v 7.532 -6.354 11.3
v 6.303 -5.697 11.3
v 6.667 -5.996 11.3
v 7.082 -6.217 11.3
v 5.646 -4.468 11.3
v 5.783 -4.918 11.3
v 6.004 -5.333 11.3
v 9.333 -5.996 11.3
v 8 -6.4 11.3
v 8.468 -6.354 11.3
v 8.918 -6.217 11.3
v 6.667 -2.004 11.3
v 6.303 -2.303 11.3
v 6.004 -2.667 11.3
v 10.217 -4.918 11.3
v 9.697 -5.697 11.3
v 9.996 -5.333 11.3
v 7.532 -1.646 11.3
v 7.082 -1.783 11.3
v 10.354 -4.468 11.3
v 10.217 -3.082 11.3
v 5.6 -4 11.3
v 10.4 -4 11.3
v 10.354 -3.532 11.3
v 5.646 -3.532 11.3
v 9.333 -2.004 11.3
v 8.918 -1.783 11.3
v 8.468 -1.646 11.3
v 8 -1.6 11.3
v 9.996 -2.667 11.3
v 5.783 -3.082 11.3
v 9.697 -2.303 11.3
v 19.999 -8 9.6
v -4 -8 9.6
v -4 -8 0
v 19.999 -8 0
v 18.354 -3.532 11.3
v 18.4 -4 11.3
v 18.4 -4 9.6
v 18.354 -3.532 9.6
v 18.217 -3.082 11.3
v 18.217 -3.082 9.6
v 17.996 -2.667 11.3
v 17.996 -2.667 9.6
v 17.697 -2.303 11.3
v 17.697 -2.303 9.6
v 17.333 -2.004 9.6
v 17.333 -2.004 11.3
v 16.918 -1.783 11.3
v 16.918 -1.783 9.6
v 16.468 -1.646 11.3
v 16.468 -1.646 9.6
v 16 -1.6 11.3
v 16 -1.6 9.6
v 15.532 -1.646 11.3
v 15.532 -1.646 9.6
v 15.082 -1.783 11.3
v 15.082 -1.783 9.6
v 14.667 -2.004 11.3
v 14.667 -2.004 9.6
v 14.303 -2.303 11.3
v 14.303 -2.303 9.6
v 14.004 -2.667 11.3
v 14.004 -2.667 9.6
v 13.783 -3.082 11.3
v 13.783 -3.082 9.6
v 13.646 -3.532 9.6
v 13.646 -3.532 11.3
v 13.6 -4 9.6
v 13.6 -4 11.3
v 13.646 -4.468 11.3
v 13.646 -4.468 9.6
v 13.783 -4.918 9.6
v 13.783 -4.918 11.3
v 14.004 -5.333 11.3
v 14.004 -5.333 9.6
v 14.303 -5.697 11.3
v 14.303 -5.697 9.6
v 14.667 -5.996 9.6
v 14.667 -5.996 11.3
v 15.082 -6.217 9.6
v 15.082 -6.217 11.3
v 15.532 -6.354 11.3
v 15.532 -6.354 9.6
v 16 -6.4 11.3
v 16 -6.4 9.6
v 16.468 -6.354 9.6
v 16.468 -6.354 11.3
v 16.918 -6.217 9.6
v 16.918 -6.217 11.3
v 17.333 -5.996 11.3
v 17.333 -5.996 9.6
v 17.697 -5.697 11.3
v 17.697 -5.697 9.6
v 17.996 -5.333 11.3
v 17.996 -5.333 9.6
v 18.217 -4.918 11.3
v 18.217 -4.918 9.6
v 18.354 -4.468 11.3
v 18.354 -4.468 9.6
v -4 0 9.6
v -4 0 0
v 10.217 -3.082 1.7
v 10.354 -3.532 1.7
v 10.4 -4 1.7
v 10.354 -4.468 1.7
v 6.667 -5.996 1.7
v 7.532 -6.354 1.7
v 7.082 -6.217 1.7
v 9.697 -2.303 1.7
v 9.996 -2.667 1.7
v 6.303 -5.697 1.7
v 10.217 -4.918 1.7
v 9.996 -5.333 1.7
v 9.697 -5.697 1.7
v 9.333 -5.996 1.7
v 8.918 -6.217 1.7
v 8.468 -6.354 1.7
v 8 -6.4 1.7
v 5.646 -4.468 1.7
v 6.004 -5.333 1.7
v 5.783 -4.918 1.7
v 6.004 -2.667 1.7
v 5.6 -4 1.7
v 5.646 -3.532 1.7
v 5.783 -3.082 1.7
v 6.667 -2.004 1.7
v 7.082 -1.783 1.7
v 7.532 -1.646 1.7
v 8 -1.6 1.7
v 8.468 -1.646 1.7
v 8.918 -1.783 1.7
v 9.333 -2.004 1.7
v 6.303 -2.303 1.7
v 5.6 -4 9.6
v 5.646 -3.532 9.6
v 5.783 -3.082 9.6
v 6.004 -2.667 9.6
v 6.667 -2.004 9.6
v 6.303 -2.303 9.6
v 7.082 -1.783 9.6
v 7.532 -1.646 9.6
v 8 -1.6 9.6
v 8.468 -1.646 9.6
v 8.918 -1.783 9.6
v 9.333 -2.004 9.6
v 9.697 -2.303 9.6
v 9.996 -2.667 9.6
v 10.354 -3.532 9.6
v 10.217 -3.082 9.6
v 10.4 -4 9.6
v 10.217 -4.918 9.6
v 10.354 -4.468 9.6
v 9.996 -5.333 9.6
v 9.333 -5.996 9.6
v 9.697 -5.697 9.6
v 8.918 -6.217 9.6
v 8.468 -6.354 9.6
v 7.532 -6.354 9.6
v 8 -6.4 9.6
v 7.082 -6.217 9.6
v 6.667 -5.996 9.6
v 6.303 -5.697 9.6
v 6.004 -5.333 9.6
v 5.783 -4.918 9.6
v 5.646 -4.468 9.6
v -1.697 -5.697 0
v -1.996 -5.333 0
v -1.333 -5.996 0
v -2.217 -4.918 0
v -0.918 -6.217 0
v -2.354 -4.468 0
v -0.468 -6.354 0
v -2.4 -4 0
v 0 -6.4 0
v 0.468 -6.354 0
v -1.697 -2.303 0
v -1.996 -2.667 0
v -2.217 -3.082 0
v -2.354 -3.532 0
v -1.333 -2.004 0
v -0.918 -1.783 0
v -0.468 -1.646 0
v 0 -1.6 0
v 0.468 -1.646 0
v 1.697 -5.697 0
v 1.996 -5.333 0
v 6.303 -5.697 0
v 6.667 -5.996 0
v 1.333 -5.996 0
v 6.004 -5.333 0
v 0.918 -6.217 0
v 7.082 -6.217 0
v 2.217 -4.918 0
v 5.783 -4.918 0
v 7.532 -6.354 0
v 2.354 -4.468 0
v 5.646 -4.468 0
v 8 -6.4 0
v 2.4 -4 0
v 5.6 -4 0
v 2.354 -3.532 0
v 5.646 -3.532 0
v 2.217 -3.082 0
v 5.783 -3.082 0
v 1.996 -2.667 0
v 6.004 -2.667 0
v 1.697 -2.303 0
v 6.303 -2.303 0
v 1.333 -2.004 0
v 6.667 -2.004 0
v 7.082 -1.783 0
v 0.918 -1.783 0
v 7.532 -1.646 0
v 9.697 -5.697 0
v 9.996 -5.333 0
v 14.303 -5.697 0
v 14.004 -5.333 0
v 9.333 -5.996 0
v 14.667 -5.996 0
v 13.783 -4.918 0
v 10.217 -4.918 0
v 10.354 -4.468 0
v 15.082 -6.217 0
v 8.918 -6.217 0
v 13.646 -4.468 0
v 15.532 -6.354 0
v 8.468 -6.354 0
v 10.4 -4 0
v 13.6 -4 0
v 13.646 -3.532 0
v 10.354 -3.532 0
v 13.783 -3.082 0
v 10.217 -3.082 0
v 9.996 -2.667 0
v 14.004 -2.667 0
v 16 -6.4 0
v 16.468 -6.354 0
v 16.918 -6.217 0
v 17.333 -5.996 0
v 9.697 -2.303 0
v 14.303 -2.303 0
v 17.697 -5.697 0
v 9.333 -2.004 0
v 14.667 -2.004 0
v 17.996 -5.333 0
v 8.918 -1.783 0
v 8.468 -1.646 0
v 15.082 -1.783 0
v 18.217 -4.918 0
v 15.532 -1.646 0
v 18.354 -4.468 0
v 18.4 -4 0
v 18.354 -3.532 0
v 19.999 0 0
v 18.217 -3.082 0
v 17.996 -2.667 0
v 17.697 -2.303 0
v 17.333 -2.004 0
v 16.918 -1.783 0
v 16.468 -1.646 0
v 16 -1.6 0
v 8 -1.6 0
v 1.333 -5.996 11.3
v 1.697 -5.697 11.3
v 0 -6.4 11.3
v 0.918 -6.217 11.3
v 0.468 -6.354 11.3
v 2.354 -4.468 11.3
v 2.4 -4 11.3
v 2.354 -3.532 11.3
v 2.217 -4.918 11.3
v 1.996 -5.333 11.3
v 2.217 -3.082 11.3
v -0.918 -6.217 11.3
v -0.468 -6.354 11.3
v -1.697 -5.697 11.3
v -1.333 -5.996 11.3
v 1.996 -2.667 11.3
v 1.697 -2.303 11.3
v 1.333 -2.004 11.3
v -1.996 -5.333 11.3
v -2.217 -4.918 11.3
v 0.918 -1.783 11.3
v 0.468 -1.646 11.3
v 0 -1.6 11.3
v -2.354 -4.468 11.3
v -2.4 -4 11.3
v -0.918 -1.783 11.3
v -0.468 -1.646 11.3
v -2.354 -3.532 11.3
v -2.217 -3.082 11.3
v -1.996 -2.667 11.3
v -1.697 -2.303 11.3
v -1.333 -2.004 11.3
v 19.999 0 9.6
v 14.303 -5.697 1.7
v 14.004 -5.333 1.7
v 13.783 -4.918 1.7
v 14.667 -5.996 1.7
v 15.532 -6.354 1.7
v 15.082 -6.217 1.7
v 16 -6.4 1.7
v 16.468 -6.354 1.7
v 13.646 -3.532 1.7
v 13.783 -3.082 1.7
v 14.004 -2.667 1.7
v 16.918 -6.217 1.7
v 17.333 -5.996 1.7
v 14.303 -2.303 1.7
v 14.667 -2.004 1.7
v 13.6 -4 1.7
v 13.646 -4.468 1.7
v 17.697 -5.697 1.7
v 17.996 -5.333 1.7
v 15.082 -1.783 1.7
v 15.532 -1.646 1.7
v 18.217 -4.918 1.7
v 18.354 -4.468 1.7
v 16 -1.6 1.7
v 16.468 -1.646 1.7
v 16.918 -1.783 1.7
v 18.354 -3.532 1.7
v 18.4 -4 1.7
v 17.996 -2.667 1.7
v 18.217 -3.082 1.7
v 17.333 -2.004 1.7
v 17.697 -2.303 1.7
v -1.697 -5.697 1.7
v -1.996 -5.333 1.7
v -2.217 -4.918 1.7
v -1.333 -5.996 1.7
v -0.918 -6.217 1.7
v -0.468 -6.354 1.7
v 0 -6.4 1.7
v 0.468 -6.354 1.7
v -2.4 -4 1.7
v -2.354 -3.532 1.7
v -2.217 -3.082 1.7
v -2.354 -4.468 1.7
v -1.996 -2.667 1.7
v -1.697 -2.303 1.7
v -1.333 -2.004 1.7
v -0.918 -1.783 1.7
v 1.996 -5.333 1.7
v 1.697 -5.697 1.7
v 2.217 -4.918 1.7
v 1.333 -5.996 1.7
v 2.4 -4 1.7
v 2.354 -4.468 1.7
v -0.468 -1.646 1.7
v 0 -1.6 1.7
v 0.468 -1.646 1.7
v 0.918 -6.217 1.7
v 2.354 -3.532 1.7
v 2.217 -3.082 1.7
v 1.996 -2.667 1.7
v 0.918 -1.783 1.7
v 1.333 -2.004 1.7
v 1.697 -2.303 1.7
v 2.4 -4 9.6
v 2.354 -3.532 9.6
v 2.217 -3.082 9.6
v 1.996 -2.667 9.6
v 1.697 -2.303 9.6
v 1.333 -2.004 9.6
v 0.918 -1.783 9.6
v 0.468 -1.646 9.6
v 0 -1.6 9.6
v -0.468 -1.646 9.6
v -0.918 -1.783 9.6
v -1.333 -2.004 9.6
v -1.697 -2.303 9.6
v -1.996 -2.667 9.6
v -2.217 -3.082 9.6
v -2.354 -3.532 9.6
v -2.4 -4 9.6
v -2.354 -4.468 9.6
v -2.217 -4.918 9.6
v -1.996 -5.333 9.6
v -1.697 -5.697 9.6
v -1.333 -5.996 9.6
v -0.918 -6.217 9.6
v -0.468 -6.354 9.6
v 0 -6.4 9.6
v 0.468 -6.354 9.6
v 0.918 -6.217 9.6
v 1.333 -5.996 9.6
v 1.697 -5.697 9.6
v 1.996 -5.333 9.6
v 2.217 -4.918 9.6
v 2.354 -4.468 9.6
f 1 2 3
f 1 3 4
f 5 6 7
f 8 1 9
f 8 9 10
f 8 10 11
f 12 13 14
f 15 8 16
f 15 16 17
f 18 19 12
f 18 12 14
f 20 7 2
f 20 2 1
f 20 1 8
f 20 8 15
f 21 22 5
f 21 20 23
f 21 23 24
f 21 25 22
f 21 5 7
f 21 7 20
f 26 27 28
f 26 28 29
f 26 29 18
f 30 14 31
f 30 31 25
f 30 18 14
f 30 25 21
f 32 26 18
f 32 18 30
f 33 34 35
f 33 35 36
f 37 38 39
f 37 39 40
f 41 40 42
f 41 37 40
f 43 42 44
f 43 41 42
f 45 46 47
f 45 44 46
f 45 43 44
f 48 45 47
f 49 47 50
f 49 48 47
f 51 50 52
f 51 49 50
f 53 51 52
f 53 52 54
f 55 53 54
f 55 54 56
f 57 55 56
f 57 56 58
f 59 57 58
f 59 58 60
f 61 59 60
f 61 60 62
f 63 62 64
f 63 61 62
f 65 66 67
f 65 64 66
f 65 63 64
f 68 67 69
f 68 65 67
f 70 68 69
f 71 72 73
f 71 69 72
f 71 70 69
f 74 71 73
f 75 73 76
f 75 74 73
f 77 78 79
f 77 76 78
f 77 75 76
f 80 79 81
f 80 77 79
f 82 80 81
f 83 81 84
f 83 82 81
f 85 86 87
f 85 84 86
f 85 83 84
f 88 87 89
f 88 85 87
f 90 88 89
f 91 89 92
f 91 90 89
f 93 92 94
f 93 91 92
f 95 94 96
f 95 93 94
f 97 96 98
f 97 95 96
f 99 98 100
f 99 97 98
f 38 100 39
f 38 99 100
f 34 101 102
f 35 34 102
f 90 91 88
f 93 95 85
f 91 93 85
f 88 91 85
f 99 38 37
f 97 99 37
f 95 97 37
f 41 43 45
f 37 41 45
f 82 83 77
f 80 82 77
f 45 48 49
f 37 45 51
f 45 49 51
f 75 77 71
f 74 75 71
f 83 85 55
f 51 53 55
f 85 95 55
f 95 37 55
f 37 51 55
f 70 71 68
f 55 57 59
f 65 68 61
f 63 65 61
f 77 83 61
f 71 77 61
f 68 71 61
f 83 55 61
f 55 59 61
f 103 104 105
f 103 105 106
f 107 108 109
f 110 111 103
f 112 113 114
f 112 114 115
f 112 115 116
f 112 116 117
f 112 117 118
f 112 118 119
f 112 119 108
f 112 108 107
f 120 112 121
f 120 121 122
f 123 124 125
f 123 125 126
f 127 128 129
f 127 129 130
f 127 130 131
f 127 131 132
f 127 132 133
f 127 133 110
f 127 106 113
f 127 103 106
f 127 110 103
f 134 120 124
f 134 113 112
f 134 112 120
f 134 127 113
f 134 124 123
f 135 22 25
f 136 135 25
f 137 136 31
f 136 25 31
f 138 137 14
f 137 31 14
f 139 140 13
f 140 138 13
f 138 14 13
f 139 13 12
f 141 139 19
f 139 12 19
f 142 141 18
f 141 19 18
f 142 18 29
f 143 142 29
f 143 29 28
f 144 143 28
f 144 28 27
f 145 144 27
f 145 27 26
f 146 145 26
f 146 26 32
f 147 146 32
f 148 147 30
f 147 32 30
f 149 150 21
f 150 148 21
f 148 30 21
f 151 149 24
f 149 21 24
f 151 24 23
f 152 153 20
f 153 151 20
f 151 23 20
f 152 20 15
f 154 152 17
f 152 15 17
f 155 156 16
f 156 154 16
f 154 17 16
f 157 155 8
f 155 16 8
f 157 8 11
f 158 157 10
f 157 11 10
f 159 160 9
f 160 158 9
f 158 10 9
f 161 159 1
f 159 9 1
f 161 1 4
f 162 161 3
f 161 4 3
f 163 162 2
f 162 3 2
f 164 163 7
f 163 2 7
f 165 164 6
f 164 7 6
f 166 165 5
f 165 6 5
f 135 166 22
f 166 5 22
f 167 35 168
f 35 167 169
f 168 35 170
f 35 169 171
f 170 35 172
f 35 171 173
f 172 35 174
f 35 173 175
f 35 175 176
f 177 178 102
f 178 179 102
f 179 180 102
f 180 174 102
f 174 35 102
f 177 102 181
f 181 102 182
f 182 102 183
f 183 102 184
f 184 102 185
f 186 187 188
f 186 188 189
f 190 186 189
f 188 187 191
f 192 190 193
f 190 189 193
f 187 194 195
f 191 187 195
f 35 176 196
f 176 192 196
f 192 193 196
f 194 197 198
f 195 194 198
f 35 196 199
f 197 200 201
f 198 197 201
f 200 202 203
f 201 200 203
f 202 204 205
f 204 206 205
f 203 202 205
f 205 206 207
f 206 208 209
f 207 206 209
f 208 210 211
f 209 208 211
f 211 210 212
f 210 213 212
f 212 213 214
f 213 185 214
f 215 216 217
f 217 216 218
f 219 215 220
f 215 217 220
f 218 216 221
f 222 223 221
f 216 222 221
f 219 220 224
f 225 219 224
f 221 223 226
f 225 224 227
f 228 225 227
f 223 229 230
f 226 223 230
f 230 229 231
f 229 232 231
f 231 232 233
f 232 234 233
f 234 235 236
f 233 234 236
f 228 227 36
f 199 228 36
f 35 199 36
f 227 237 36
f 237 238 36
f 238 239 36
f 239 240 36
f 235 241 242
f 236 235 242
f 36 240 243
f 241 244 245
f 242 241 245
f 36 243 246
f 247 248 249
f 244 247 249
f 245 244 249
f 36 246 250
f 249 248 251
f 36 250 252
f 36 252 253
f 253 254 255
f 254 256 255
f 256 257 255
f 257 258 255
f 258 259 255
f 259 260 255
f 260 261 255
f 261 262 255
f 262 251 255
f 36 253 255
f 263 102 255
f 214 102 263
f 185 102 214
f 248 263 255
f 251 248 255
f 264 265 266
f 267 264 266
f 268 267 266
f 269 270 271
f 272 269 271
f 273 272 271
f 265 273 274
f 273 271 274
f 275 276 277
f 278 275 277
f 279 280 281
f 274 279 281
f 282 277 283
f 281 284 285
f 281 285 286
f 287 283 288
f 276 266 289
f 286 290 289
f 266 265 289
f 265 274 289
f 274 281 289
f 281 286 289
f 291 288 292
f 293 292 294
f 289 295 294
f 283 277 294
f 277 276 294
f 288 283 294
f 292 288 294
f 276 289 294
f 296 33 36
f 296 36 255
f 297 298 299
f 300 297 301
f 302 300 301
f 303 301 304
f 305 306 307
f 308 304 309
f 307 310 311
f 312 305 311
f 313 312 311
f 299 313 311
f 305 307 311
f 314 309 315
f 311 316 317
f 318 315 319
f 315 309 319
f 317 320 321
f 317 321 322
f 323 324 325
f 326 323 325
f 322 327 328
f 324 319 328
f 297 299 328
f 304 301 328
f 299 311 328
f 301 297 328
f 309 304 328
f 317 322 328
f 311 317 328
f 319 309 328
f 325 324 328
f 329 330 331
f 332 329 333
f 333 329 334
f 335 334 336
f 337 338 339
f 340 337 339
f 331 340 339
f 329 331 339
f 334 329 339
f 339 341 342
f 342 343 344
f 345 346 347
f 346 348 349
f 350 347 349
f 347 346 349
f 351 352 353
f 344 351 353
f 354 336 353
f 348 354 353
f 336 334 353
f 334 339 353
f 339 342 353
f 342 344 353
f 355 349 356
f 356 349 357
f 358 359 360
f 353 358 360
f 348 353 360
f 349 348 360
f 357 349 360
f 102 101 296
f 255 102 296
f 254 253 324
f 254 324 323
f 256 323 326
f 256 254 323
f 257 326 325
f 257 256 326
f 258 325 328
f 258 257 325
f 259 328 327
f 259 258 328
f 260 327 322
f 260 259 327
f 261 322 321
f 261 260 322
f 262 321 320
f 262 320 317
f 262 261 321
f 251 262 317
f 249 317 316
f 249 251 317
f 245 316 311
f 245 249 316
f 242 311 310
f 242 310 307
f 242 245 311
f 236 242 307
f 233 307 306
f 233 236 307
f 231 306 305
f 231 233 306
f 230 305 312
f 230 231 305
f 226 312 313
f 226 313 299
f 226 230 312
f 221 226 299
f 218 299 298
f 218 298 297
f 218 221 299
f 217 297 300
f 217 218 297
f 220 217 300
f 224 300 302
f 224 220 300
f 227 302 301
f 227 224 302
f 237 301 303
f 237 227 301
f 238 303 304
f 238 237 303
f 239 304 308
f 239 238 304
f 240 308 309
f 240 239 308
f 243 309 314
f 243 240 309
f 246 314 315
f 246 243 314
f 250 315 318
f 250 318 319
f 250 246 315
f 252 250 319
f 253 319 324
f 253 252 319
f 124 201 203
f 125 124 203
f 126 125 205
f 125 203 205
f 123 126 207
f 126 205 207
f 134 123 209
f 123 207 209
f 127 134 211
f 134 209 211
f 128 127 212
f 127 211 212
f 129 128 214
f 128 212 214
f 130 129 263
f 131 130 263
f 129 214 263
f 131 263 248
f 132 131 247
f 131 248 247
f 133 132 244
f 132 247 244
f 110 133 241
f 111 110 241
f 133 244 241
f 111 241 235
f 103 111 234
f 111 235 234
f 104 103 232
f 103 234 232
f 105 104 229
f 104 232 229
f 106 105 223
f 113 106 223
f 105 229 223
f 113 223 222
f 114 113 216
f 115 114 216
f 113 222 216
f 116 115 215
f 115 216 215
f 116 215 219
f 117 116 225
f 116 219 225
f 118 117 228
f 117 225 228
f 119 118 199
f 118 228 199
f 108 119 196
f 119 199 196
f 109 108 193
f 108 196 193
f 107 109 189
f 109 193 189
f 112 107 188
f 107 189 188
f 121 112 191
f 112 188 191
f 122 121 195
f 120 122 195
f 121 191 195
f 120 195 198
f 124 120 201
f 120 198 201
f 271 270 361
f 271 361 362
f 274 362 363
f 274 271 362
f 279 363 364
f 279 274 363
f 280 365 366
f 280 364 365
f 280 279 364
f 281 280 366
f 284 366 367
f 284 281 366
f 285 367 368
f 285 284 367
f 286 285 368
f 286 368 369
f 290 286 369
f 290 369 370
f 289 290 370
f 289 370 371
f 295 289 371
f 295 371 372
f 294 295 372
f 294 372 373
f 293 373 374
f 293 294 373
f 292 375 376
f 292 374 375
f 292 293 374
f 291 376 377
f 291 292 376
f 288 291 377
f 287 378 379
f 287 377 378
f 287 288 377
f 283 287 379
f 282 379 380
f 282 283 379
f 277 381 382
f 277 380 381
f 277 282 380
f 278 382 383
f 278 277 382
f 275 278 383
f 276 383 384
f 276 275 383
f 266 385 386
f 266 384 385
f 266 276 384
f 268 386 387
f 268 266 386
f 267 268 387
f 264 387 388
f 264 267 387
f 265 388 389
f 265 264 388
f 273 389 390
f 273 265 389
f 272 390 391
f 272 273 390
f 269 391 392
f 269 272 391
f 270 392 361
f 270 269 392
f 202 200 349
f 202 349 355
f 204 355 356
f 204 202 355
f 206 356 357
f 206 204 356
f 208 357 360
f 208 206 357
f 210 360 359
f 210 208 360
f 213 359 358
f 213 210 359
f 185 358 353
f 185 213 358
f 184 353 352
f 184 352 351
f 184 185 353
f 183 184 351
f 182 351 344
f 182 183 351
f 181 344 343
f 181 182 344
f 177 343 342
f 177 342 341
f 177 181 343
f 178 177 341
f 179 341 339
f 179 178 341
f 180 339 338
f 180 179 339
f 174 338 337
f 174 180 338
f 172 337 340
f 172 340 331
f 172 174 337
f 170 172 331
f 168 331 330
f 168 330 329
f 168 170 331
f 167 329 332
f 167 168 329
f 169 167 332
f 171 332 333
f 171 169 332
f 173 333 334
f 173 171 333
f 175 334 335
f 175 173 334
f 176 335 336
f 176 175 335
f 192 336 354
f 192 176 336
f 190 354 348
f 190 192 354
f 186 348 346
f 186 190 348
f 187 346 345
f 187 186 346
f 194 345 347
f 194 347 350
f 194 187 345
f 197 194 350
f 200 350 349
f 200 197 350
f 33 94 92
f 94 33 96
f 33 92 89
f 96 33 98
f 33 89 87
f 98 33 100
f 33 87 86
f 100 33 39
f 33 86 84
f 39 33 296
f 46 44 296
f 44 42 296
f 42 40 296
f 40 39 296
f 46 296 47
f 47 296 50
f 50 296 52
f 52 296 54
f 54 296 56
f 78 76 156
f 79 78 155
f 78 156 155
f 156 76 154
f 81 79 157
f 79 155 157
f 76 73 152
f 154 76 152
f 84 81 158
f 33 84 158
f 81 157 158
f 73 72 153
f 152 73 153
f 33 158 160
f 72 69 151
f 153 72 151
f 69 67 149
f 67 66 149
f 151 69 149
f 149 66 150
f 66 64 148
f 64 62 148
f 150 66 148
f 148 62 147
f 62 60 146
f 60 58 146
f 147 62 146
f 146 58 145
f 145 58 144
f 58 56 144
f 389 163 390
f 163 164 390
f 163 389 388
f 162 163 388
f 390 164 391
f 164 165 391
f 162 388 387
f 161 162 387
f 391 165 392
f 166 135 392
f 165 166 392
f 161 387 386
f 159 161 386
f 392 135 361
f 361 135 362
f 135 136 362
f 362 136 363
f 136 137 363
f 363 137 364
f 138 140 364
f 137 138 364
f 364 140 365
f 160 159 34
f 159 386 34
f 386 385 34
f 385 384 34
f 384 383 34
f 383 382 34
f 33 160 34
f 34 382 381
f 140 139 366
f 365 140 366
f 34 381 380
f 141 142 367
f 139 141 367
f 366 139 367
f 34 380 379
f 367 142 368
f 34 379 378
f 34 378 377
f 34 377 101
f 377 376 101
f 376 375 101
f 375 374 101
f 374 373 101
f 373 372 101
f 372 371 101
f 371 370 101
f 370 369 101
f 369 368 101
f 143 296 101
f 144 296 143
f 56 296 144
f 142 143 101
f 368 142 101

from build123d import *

# Parameters (mm, degrees)
F1_DEPTH  = 8
F3_W      = 8
F3_H      = 8
F3_R      = 2.4
F4_DEPTH  = 1.7
F5_R      = 2.4
F6_DEPTH  = 1.7
F11_W     = 18.3417219669
F11_H     = 18.5978962108
F12_DEPTH = 8.001


with BuildPart() as f1:
    # F0 (on Front) → F1 (new body)
    with BuildSketch(Plane.XZ):
        Polygon((-2.4, 9.6), (-4, 9.6), (-4, 0), (4, 0), (4, 9.6), (2.4, 9.6), (2.4, 11.3), (-2.4, 11.3), align=None)
    extrude(amount=F1_DEPTH)

    # F3 (on plane+point) → F4 (cut, through all)
    with BuildSketch(Plane.XY.offset(11.3)):
        with Locations((0, -4)):
            Rectangle(F3_W, F3_H)
        with Locations((0, -4)):
            Circle(F3_R, mode=Mode.SUBTRACT)
    extrude(amount=-F4_DEPTH, mode=Mode.SUBTRACT)

    # F5 (on Top) → F6 (cut)
    with BuildSketch(Plane.XY):
        with Locations((0, -4)):
            Circle(F5_R)
    extrude(amount=F6_DEPTH, mode=Mode.SUBTRACT)

    # F8: F1 across plane


with BuildPart() as f1_1:
    add(f1.part)
    add(f1.part.mirror(Plane.YZ.offset(4)))

    # F10: F1 across plane


with BuildPart() as f1_2:
    add(f1_1.part)
    add(f1_1.part.mirror(Plane.YZ.offset(12)))

    # F11 (on face) → F12 (cut)
    with BuildSketch(Plane.YZ.offset(28)):
        with Locations((-4.3679764494, 6.4113480039)):
            Rectangle(F11_W, F11_H)
    extrude(amount=-F12_DEPTH, mode=Mode.SUBTRACT)


solid = f1_2.part
